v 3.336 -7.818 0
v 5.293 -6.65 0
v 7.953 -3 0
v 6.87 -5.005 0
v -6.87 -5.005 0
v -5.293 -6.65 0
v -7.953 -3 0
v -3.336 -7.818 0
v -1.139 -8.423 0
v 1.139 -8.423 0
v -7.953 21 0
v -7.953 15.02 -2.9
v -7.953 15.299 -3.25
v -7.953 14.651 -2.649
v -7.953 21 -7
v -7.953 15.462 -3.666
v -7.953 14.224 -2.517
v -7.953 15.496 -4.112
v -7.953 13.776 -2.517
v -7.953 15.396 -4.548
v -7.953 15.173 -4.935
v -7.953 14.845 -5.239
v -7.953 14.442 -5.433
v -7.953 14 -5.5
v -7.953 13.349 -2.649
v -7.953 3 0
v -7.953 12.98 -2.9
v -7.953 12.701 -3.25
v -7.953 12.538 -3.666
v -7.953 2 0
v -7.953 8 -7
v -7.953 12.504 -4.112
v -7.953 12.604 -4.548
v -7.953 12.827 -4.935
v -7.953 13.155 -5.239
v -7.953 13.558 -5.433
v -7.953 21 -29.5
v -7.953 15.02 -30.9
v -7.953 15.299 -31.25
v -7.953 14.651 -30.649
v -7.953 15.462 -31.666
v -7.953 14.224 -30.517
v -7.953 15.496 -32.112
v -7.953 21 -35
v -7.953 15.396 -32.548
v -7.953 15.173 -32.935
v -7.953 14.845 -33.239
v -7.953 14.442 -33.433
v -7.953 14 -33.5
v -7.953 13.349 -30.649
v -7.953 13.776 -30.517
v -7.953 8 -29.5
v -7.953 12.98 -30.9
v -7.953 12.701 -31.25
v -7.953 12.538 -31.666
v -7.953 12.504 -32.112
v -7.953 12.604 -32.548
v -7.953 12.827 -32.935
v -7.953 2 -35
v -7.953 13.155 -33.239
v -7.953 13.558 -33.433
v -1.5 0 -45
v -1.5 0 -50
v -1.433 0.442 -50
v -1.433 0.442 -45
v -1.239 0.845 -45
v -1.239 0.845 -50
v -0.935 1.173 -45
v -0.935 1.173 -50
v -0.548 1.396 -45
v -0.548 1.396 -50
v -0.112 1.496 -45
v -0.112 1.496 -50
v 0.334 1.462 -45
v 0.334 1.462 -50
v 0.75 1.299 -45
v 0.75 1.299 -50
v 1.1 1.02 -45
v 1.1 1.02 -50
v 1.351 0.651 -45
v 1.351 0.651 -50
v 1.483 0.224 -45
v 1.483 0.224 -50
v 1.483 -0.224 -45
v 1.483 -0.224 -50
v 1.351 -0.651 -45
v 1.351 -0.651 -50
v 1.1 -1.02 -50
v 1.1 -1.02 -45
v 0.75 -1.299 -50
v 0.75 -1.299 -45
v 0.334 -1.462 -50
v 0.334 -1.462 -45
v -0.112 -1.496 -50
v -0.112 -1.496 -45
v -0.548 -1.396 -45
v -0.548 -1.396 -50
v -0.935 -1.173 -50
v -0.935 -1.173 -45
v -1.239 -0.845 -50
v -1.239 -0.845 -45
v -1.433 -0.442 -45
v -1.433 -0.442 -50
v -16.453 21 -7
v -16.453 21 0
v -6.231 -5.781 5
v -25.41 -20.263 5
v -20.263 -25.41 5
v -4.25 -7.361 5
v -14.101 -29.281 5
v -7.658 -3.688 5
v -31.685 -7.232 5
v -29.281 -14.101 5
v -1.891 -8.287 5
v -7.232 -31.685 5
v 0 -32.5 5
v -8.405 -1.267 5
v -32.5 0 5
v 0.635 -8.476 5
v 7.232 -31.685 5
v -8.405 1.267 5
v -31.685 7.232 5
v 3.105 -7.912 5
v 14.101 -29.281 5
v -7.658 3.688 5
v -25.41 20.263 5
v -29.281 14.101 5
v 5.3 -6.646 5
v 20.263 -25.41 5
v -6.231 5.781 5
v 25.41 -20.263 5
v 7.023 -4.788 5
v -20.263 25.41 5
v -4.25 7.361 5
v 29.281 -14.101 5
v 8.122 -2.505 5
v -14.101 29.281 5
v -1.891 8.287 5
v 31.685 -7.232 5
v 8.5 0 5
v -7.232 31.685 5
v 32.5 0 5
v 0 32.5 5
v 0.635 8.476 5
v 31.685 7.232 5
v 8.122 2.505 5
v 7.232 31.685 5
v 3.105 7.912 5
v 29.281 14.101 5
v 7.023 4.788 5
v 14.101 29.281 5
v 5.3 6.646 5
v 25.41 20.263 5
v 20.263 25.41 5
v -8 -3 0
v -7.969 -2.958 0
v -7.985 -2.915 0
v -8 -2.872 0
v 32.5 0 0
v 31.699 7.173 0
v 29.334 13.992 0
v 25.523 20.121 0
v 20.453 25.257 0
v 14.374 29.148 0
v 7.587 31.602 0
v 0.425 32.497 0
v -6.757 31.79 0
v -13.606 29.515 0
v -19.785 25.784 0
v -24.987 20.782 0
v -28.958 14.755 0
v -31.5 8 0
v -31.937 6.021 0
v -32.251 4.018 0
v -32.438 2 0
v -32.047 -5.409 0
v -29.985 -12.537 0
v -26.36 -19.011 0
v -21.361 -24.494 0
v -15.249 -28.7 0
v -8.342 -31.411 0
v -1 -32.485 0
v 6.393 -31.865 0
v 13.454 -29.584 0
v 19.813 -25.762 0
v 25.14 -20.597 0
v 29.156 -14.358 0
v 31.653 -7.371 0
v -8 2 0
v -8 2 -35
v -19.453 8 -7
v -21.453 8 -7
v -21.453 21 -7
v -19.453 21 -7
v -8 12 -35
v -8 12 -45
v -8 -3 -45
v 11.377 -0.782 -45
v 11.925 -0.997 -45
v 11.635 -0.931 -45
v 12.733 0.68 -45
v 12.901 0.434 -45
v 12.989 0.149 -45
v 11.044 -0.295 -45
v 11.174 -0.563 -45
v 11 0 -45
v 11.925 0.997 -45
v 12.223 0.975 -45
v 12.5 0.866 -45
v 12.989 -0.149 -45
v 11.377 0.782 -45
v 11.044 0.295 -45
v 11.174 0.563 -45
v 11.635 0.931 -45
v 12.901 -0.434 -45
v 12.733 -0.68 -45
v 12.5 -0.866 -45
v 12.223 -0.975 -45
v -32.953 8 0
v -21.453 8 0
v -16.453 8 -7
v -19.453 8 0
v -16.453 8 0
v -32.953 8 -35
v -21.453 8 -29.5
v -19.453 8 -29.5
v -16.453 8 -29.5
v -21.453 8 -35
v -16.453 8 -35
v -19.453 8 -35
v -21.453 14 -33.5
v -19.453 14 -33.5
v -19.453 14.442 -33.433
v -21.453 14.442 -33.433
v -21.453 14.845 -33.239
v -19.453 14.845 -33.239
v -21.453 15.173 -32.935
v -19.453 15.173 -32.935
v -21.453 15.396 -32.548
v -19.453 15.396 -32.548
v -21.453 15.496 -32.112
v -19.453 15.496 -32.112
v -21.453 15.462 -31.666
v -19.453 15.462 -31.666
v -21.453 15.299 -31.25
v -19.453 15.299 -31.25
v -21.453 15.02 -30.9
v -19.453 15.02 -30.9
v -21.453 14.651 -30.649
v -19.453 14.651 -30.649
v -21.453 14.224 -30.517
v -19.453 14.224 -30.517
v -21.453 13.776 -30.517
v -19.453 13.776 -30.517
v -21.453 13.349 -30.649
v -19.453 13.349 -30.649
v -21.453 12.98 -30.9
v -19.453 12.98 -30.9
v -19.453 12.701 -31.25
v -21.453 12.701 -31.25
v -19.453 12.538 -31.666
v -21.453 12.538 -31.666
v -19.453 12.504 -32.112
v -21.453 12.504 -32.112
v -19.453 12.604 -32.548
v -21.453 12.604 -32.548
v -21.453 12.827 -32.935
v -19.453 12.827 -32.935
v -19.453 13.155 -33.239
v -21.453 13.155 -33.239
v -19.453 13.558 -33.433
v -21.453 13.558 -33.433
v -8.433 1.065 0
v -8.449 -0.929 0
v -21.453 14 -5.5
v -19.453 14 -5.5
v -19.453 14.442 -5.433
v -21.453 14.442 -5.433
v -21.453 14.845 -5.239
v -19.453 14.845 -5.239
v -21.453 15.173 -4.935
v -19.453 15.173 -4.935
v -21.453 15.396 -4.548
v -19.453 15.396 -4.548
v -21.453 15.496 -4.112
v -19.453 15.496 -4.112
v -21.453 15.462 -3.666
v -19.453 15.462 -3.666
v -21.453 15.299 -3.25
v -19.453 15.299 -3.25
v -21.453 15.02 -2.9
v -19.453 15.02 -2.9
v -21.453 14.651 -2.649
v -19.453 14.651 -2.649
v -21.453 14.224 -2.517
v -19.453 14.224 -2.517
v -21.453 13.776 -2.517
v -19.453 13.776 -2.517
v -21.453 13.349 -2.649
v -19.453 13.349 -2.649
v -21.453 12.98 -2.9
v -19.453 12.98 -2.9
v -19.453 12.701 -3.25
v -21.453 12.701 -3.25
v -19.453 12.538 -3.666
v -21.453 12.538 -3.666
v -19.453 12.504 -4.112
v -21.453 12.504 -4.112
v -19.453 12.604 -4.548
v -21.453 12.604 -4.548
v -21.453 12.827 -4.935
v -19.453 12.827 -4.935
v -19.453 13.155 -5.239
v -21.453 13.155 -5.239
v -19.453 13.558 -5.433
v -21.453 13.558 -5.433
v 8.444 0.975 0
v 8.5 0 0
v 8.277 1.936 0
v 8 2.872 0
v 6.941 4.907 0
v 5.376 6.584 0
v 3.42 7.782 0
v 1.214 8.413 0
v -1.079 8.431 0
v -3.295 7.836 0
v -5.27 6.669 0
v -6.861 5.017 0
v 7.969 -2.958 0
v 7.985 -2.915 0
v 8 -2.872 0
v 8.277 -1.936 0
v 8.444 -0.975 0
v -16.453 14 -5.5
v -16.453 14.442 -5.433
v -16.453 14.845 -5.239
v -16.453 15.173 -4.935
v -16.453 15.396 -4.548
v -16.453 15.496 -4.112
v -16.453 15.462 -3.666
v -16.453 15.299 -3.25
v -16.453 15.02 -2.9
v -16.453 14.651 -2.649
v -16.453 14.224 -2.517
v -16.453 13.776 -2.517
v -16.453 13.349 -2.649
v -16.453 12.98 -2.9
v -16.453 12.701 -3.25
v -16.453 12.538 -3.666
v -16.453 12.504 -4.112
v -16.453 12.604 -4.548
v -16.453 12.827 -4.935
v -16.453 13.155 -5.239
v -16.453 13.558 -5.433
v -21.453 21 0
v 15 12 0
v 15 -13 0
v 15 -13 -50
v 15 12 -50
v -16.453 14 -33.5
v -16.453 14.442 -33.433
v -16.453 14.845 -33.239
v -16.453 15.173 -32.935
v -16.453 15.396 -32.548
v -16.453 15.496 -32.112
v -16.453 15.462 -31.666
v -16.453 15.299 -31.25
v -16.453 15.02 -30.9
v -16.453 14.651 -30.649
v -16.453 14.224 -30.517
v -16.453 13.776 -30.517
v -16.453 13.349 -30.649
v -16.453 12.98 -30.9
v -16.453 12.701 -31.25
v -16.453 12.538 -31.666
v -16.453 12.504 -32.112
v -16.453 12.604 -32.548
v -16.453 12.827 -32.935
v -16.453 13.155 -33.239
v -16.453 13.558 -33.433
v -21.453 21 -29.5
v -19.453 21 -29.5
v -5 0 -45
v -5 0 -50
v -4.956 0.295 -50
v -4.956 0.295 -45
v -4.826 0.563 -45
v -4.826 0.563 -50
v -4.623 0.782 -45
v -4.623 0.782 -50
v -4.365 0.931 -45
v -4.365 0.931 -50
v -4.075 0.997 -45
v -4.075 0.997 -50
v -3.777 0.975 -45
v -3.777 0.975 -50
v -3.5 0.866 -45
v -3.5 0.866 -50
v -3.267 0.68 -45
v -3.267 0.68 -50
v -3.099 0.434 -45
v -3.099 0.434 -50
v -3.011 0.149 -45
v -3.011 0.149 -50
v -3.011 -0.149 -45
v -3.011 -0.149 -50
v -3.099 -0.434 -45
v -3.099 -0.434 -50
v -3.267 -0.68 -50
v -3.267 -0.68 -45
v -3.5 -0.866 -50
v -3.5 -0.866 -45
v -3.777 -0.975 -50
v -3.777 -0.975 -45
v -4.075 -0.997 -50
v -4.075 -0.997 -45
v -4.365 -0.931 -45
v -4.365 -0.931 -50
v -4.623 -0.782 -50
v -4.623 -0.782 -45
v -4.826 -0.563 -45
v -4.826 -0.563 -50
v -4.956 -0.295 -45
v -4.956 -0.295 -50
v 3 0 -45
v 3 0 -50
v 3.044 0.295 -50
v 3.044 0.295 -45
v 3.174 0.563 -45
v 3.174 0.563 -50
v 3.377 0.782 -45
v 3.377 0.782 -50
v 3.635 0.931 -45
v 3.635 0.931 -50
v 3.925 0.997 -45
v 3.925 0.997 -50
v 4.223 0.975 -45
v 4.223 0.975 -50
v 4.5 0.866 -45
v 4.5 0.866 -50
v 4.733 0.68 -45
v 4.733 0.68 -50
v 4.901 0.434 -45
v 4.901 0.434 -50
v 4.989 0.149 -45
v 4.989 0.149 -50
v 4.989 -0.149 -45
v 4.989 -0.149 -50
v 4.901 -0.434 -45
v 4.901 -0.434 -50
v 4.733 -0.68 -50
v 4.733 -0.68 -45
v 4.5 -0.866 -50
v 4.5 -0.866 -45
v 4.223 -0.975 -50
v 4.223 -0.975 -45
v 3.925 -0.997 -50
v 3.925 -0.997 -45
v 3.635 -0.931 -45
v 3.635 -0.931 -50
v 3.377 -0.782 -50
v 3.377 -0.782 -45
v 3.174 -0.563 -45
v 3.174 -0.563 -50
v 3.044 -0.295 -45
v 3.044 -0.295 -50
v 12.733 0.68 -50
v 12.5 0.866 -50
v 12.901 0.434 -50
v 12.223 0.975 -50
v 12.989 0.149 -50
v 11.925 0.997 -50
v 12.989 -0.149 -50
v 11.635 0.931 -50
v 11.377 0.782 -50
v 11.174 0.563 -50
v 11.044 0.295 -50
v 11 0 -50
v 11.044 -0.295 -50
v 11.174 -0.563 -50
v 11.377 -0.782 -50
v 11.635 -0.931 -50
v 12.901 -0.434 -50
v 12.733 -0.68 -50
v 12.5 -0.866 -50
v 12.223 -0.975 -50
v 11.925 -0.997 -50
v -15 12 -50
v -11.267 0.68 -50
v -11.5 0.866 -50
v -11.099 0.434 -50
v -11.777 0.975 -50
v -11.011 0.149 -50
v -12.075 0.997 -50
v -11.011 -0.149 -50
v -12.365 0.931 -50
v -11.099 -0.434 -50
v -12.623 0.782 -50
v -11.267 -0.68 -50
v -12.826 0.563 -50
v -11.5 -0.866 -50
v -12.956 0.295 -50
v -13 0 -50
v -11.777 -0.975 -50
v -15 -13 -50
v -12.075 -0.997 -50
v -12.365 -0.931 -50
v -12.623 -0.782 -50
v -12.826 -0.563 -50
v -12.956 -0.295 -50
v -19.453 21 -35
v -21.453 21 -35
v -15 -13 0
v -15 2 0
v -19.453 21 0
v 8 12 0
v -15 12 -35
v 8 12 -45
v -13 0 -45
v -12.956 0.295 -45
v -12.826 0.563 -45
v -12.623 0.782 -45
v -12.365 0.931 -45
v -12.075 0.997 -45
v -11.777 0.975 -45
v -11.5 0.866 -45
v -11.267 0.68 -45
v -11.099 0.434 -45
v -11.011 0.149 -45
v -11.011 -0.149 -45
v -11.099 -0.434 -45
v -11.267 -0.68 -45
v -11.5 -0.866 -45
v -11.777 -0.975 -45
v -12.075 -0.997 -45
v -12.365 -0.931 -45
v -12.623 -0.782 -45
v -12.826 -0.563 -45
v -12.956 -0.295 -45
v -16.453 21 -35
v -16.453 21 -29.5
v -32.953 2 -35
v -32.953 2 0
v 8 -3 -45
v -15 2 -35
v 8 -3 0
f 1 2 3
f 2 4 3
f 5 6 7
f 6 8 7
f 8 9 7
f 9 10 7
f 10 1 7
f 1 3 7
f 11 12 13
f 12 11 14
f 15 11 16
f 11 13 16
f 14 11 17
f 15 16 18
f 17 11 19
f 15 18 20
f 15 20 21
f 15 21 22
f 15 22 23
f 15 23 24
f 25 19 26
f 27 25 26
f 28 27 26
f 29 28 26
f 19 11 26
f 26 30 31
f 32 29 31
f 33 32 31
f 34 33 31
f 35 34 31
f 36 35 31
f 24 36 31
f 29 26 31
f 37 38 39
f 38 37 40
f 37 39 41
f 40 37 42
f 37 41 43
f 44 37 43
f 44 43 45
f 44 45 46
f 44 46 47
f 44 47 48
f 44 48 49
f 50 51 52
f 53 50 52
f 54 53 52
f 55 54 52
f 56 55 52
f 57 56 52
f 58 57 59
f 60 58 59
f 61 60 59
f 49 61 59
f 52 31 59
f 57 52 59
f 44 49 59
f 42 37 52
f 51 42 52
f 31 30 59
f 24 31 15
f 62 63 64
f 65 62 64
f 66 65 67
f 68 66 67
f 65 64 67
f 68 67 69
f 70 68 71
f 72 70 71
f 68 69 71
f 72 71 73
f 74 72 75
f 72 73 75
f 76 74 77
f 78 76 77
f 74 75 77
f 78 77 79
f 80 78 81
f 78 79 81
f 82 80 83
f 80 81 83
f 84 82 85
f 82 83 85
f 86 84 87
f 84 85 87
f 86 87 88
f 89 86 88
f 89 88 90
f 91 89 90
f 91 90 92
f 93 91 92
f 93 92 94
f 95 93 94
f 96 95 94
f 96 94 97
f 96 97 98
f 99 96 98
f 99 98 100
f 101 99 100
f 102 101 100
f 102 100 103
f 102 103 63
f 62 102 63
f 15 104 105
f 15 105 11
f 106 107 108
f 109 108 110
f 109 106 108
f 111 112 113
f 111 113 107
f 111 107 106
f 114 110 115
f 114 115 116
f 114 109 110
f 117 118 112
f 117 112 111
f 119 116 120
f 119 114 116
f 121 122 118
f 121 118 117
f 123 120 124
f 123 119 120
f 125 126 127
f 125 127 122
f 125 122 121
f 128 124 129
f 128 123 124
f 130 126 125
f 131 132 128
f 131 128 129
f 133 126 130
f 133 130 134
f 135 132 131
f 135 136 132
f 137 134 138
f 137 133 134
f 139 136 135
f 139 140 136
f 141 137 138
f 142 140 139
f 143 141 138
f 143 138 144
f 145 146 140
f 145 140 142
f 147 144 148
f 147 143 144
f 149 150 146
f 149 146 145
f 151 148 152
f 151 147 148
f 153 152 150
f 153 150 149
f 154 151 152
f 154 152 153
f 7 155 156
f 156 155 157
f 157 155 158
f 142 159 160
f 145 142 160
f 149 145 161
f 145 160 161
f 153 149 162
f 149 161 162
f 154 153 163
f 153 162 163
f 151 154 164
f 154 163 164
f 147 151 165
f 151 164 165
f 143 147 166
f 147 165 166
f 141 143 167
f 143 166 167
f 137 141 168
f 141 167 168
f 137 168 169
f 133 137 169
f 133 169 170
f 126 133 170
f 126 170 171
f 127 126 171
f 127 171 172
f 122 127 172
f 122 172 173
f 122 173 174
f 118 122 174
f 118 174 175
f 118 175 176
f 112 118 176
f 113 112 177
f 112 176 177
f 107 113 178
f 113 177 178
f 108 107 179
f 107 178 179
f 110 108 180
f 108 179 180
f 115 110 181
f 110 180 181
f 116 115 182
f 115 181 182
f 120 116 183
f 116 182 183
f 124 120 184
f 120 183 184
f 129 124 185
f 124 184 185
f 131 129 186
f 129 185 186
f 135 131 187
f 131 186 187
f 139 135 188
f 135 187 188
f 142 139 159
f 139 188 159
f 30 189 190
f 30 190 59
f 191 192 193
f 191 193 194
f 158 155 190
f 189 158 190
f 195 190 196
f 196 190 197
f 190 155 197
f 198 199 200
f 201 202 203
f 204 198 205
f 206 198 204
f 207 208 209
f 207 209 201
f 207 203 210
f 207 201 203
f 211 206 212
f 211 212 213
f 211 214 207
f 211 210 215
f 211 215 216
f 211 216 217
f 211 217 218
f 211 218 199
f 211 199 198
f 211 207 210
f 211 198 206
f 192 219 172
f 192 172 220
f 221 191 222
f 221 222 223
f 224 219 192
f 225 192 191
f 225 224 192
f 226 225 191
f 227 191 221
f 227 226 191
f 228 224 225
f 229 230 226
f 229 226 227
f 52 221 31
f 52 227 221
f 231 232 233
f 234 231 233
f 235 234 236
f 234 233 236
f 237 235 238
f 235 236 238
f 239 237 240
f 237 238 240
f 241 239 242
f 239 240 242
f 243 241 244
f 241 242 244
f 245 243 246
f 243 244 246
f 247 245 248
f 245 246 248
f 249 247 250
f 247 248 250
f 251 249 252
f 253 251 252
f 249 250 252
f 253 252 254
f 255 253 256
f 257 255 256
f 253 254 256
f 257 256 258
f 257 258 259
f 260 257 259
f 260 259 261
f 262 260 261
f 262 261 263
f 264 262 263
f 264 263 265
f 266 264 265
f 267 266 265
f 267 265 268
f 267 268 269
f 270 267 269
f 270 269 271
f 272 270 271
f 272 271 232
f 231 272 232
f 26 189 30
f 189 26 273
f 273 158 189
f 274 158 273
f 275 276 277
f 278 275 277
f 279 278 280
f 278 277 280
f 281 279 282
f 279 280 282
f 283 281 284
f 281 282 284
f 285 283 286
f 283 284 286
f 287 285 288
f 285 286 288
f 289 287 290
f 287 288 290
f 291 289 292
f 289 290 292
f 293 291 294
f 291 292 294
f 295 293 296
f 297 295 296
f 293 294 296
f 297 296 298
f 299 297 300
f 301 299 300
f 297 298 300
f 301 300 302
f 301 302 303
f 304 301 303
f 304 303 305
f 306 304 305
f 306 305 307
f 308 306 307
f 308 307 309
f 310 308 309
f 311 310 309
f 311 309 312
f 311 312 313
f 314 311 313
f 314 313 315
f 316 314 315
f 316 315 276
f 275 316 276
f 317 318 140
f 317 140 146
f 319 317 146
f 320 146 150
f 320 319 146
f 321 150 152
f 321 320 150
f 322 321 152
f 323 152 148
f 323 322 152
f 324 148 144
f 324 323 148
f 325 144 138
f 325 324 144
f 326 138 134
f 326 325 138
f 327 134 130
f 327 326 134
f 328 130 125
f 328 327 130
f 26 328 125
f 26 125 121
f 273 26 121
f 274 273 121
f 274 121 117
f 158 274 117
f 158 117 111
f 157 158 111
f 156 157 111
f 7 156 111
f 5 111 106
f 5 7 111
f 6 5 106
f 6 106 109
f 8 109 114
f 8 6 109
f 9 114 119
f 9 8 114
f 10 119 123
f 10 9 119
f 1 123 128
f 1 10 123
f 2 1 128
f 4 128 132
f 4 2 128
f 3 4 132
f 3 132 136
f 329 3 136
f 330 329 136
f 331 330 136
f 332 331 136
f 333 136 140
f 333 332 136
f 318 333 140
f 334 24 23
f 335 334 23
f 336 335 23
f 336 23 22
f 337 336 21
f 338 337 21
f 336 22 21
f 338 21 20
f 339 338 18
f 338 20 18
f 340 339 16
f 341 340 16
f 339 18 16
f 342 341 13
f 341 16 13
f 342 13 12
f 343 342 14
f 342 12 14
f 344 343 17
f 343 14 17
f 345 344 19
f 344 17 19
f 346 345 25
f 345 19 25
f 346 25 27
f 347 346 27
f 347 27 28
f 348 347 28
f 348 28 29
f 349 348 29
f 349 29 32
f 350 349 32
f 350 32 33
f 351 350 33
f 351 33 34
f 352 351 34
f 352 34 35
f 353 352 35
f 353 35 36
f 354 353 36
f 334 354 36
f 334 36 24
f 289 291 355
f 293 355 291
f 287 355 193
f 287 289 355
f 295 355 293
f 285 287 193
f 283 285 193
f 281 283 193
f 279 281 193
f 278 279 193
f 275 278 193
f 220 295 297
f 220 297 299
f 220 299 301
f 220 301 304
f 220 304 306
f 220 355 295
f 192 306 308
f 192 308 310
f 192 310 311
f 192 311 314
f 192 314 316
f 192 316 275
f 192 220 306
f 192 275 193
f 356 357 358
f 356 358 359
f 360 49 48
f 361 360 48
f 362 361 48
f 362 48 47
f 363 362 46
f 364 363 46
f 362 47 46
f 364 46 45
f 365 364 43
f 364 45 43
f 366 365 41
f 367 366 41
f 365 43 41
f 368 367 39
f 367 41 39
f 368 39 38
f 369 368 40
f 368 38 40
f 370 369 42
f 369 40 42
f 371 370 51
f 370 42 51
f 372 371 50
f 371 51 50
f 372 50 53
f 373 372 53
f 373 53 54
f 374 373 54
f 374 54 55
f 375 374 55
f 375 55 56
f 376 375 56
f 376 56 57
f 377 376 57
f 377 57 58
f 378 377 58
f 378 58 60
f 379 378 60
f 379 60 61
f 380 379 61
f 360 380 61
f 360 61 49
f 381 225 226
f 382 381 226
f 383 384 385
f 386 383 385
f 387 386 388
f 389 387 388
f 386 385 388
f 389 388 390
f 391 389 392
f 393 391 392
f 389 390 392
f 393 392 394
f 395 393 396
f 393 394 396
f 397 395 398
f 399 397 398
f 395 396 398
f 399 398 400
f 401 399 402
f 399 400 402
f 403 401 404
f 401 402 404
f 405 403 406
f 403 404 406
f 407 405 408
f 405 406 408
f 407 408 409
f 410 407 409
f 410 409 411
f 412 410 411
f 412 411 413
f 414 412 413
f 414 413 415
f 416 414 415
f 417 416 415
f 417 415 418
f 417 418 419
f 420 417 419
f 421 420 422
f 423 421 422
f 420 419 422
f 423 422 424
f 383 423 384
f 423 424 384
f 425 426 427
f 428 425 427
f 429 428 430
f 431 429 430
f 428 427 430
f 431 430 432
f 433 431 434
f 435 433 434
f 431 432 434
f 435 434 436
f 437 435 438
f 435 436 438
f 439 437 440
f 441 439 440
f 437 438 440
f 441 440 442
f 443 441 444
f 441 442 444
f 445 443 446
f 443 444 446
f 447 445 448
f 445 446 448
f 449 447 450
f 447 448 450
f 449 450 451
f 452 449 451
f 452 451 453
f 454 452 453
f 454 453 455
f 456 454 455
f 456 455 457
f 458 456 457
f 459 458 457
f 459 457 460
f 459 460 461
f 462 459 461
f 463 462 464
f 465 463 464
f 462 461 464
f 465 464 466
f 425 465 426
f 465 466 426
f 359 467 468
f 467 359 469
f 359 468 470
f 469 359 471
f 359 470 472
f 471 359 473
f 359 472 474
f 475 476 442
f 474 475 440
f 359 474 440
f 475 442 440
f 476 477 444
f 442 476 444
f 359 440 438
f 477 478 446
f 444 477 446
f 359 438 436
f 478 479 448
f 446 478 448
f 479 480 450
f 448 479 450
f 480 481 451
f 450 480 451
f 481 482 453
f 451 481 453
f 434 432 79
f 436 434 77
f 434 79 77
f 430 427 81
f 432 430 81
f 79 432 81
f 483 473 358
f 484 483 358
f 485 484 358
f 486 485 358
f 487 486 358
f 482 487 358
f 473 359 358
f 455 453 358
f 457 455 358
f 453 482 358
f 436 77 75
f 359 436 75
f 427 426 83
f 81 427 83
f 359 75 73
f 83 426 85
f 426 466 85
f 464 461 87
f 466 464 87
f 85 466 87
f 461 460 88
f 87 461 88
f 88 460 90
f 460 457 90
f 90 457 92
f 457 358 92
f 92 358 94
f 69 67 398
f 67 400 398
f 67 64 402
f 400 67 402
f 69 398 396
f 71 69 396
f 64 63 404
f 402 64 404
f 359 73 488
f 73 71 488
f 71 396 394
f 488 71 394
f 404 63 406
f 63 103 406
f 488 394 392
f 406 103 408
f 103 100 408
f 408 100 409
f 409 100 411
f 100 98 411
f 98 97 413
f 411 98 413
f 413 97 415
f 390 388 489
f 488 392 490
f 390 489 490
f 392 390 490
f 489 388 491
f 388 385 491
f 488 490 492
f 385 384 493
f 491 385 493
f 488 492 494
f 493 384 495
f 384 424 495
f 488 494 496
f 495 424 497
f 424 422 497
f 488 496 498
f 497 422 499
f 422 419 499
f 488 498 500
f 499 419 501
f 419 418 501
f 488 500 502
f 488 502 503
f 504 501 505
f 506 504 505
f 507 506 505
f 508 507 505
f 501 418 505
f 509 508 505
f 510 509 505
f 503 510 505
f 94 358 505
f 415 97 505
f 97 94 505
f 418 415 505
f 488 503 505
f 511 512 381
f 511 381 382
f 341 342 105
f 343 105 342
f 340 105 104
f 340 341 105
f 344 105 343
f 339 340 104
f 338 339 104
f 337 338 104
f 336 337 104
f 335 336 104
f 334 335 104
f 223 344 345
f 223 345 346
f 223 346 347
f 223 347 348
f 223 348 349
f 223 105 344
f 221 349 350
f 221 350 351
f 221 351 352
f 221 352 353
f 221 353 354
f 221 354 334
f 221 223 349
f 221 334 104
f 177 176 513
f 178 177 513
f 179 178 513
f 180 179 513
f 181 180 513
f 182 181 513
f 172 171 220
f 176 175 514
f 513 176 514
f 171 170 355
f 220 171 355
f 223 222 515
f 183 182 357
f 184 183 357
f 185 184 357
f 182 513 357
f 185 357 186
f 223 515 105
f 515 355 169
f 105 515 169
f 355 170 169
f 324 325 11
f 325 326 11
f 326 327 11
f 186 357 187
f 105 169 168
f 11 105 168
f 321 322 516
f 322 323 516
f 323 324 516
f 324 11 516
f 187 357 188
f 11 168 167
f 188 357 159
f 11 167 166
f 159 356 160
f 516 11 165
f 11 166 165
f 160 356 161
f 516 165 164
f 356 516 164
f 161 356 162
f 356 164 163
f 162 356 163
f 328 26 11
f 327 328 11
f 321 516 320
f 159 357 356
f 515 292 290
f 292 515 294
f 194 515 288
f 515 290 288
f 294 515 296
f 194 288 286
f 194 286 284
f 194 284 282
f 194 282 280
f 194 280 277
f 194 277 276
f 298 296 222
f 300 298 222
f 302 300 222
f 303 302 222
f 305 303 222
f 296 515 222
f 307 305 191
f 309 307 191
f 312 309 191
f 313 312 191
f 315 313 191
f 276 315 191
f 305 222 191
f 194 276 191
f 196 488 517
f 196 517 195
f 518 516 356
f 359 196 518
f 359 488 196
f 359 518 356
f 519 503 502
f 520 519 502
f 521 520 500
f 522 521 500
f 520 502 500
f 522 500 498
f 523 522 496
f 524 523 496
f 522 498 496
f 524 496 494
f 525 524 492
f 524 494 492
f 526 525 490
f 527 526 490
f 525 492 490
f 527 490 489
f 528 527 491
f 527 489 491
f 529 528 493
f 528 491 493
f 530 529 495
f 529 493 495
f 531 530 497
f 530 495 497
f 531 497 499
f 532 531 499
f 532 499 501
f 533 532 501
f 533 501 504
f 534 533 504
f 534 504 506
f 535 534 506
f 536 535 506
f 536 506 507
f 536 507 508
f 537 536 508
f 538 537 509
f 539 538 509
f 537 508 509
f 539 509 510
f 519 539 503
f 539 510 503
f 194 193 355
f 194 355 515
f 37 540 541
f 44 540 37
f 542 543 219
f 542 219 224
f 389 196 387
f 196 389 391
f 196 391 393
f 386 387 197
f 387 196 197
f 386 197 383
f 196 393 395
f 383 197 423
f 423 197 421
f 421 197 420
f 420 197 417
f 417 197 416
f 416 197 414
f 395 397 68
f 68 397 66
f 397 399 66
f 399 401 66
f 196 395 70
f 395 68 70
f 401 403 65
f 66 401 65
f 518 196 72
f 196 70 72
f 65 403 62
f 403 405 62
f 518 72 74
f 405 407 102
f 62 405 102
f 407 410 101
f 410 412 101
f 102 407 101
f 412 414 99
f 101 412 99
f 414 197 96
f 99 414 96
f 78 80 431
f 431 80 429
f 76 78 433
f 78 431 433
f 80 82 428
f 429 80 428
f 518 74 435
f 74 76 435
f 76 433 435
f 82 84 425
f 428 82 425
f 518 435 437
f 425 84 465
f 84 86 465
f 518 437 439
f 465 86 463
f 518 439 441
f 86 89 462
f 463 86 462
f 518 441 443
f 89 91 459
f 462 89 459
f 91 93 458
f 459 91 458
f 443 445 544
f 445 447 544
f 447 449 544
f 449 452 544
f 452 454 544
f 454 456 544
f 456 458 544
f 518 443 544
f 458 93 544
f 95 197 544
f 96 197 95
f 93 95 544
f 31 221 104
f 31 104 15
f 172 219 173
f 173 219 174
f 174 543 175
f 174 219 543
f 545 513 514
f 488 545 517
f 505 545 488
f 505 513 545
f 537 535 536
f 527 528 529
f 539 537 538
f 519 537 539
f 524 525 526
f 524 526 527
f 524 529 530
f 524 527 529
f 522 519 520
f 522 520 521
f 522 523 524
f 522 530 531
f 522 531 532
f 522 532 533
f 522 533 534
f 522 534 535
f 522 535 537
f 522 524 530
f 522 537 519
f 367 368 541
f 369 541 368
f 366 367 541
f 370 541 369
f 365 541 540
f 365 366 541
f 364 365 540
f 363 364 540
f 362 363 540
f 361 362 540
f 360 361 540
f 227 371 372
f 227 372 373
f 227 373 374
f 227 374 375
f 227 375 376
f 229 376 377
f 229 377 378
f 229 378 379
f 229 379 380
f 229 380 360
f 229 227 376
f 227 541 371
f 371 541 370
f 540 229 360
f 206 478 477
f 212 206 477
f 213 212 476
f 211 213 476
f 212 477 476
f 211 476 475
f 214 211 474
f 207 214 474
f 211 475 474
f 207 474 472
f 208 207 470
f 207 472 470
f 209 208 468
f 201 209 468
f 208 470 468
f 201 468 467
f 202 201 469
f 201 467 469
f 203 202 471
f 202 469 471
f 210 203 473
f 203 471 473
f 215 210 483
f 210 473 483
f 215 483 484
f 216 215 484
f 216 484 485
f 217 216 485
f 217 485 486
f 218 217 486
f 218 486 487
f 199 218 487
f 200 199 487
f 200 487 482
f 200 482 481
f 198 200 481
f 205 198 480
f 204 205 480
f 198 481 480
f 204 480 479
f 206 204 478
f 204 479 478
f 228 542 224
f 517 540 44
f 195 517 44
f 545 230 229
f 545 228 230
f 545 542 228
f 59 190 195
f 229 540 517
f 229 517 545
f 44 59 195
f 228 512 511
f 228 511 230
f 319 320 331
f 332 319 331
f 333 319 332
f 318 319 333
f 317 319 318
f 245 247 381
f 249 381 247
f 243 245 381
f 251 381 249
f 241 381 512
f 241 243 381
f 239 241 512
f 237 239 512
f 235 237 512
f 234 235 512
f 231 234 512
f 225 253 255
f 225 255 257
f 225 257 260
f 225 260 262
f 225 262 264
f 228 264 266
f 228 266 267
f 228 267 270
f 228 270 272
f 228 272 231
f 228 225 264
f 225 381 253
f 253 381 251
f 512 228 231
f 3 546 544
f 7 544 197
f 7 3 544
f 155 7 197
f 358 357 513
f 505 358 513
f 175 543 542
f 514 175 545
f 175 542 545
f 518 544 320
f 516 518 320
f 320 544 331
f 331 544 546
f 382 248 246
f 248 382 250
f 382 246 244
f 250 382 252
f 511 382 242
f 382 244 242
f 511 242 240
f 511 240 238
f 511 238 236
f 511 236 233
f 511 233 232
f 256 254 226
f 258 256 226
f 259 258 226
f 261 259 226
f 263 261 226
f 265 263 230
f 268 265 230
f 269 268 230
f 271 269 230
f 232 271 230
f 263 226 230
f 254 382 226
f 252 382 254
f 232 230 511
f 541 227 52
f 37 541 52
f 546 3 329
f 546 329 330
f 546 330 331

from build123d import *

# Parameters (mm, degrees)
CROQUIS1_R               = 32.5
CROQUIS1_R_2             = 8.5
SALIENTE_EXTRUIR1_DEPTH  = 5
CROQUIS3_W               = 30
CROQUIS3_H               = 10
SALIENTE_EXTRUIR5_DEPTH  = 50
CROQUIS4_W               = 7
CROQUIS4_H               = 50
SALIENTE_EXTRUIR6_DEPTH  = 5
CROQUIS5_W               = 25
CROQUIS5_H               = 35
SALIENTE_EXTRUIR7_DEPTH  = 6
CROQUIS6_W               = 8.5
CROQUIS6_H               = 5.5
CROQUIS6_W_2             = 2
CROQUIS6_H_2             = 7
SALIENTE_EXTRUIR8_DEPTH  = 13
CROQUIS7_R               = 1.5
CORTAR_EXTRUIR1_DEPTH    = 20
CROQUIS8_W               = 16
CROQUIS8_H               = 5
SALIENTE_EXTRUIR9_DEPTH  = 5
SALIENTE_EXTRUIR10_DEPTH = 10
CROQUIS11_R              = 1
CORTAR_EXTRUIR2_DEPTH    = 5
CROQUIS13_R              = 1.5
CORTAR_EXTRUIR3_DEPTH    = 10


with BuildPart() as part:
    # Croquis1 → Saliente-Extruir1 (new body)
    with BuildSketch(Plane.XY):
        Circle(CROQUIS1_R)
        Circle(CROQUIS1_R_2, mode=Mode.SUBTRACT)
    extrude(amount=SALIENTE_EXTRUIR1_DEPTH)

    # Croquis3 → Saliente-Extruir5 (add)
    with BuildSketch(Plane(origin=(0, 0, 0), x_dir=(-1, 0, 0), z_dir=(0, 0, -1))):
        with Locations((0, -8)):
            Rectangle(CROQUIS3_W, CROQUIS3_H)
    extrude(amount=SALIENTE_EXTRUIR5_DEPTH)

    # Croquis4 → Saliente-Extruir6 (add)
    with BuildSketch(Plane(origin=(0, -3, 0), x_dir=(1, 0, 0), z_dir=(0, 1, 0))):
        with Locations((-11.5, 25)):
            Rectangle(CROQUIS4_W, CROQUIS4_H)
        with Locations((11.5, 25)):
            Rectangle(CROQUIS4_W, CROQUIS4_H)
    extrude(amount=SALIENTE_EXTRUIR6_DEPTH)

    # Croquis5 → Saliente-Extruir7 (add)
    with BuildSketch(Plane(origin=(0, 2, 0), x_dir=(1, 0, 0), z_dir=(0, 1, 0))):
        with Locations((-20.45298686, 17.5)):
            Rectangle(CROQUIS5_W, CROQUIS5_H)
    extrude(amount=SALIENTE_EXTRUIR7_DEPTH)

    # Croquis6 → Saliente-Extruir8 (add)
    with BuildSketch(Plane(origin=(0, 8, 0), x_dir=(1, 0, 0), z_dir=(0, 1, 0))):
        with Locations((-12.20298686, 32.25)):
            Rectangle(CROQUIS6_W, CROQUIS6_H)
        with Locations((-20.45298686, 32.25)):
            Rectangle(CROQUIS6_W_2, CROQUIS6_H)
        with Locations((-12.20298686, 3.5)):
            Rectangle(CROQUIS6_W, CROQUIS6_H_2)
        with Locations((-20.45298686, 3.5)):
            Rectangle(CROQUIS6_W_2, CROQUIS6_H_2)
    extrude(amount=SALIENTE_EXTRUIR8_DEPTH)

    # Croquis7 → Cortar-Extruir1 (cut)
    with BuildSketch(Plane(origin=(-7.95298686, 0, 0), x_dir=(0, 0, -1), z_dir=(1, 0, 0))):
        with Locations((32, 14)):
            Circle(CROQUIS7_R)
        with Locations((4, 14)):
            Circle(CROQUIS7_R)
    extrude(amount=-CORTAR_EXTRUIR1_DEPTH, mode=Mode.SUBTRACT)

    # Croquis8 → Saliente-Extruir9 (add)
    with BuildSketch(Plane(origin=(0, -3, 0), x_dir=(1, 0, 0), z_dir=(0, 1, 0))):
        with Locations((0, 47.5)):
            Rectangle(CROQUIS8_W, CROQUIS8_H)
    extrude(amount=SALIENTE_EXTRUIR9_DEPTH)

    # Croquis10 → Saliente-Extruir10 (add)
    with BuildSketch(Plane(origin=(0, 2, 0), x_dir=(1, 0, 0), z_dir=(0, 1, 0))):
        Polygon((8, 0), (15, 0), (15, 50), (-15, 50), (-15, 35), (-8, 35), (-8, 45), (8, 45), align=None)
    extrude(amount=SALIENTE_EXTRUIR10_DEPTH)

    # Croquis11 → Cortar-Extruir2 (cut)
    with BuildSketch(Plane(origin=(0, 0, -50), x_dir=(-1, 0, 0), z_dir=(0, 0, -1))):
        with Locations((-4, 0)):
            Circle(CROQUIS11_R)
        with Locations((-12, 0)):
            Circle(CROQUIS11_R)
        with Locations((4, 0)):
            Circle(CROQUIS11_R)
        with Locations((12, 0)):
            Circle(CROQUIS11_R)
    extrude(amount=-CORTAR_EXTRUIR2_DEPTH, mode=Mode.SUBTRACT)

    # Croquis13 → Cortar-Extruir3 (cut)
    with BuildSketch(Plane(origin=(0, 0, -50), x_dir=(-1, 0, 0), z_dir=(0, 0, -1))):
        Circle(CROQUIS13_R)
    extrude(amount=-CORTAR_EXTRUIR3_DEPTH, mode=Mode.SUBTRACT)


solid = part.part
